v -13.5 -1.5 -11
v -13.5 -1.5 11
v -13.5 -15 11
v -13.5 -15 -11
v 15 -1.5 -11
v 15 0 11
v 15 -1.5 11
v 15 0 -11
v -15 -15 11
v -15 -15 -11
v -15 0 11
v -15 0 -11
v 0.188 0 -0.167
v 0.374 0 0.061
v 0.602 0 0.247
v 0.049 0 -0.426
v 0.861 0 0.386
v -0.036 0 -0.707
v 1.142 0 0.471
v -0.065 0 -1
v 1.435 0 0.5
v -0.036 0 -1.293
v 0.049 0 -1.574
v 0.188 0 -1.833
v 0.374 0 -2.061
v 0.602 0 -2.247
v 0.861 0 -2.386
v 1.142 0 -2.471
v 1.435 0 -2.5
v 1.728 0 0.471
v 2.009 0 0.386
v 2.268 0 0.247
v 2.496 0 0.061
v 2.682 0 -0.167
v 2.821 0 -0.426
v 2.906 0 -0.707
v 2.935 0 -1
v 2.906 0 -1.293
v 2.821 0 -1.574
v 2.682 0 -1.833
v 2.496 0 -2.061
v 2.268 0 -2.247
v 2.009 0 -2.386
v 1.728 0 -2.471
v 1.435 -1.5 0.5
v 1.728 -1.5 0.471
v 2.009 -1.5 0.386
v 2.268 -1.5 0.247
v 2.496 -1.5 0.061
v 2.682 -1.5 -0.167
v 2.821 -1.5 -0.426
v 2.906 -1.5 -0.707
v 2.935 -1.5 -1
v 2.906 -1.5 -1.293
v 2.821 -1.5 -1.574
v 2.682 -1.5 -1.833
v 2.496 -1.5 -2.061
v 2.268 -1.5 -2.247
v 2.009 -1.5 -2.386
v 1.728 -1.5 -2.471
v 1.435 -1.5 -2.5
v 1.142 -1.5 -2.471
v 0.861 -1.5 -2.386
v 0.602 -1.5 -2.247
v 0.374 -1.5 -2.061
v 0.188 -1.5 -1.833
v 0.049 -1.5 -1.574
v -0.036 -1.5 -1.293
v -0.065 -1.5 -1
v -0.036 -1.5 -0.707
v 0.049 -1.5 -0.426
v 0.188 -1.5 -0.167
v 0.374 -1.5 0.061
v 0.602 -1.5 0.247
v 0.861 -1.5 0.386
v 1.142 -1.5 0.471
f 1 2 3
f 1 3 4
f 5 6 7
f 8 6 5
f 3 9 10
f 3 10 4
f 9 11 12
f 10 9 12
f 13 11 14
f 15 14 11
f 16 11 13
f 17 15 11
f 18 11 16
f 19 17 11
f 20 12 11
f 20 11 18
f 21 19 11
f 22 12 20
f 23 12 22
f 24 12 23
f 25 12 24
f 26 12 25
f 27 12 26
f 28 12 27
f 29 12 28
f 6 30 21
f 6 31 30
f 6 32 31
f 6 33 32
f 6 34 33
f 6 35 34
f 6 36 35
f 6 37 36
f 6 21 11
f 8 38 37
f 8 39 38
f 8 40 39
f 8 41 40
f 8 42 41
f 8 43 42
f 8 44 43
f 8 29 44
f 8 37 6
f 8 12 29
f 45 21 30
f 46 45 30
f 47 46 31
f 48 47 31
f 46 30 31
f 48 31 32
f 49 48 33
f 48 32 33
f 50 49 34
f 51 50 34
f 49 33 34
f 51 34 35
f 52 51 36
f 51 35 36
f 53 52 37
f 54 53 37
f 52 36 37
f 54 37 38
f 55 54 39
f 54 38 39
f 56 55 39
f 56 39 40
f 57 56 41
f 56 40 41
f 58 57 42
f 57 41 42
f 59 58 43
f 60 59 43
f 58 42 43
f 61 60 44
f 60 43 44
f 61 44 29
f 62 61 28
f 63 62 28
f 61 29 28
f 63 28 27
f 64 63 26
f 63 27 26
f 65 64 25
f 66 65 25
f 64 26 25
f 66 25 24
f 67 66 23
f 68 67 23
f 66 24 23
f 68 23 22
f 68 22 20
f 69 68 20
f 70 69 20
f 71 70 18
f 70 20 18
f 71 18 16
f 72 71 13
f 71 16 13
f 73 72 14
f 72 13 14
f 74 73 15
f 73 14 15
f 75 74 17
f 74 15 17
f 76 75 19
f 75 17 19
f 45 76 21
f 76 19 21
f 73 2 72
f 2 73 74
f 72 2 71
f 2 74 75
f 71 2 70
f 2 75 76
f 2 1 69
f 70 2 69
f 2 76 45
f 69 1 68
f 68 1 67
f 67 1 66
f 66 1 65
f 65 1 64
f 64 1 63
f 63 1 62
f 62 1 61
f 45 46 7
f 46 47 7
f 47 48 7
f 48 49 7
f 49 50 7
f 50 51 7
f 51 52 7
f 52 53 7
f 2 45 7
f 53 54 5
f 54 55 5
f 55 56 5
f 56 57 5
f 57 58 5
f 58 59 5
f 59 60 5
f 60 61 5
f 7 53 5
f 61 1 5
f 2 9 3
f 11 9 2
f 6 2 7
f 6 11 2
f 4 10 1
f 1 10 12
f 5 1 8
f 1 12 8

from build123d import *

# Parameters (mm, degrees)
SKETCH1_W           = 28.5
SKETCH1_H           = 22
SKETCH1_R           = 1.5
BOSS_EXTRUDE1_DEPTH = 1.5
SKETCH1_3_W         = 1.5
SKETCH1_3_H         = 22
BOSS_EXTRUDE2_DEPTH = 15


with BuildPart() as part:
    # Sketch1 → Boss-Extrude1 (new body)
    with BuildSketch(Plane(origin=(0, 0, 0), x_dir=(1, 0, 0), z_dir=(0, 1, 0))):
        with Locations((0.75, 0)):
            Rectangle(SKETCH1_W, SKETCH1_H)
        with Locations((1.435, 1)):
            Circle(SKETCH1_R, mode=Mode.SUBTRACT)
    extrude(amount=-BOSS_EXTRUDE1_DEPTH)

    # Sketch1<3> → Boss-Extrude2 (add)
    with BuildSketch(Plane(origin=(0, 0, 0), x_dir=(1, 0, 0), z_dir=(0, 1, 0))):
        with Locations((-14.25, 0)):
            Rectangle(SKETCH1_3_W, SKETCH1_3_H)
    extrude(amount=-BOSS_EXTRUDE2_DEPTH)


solid = part.part
